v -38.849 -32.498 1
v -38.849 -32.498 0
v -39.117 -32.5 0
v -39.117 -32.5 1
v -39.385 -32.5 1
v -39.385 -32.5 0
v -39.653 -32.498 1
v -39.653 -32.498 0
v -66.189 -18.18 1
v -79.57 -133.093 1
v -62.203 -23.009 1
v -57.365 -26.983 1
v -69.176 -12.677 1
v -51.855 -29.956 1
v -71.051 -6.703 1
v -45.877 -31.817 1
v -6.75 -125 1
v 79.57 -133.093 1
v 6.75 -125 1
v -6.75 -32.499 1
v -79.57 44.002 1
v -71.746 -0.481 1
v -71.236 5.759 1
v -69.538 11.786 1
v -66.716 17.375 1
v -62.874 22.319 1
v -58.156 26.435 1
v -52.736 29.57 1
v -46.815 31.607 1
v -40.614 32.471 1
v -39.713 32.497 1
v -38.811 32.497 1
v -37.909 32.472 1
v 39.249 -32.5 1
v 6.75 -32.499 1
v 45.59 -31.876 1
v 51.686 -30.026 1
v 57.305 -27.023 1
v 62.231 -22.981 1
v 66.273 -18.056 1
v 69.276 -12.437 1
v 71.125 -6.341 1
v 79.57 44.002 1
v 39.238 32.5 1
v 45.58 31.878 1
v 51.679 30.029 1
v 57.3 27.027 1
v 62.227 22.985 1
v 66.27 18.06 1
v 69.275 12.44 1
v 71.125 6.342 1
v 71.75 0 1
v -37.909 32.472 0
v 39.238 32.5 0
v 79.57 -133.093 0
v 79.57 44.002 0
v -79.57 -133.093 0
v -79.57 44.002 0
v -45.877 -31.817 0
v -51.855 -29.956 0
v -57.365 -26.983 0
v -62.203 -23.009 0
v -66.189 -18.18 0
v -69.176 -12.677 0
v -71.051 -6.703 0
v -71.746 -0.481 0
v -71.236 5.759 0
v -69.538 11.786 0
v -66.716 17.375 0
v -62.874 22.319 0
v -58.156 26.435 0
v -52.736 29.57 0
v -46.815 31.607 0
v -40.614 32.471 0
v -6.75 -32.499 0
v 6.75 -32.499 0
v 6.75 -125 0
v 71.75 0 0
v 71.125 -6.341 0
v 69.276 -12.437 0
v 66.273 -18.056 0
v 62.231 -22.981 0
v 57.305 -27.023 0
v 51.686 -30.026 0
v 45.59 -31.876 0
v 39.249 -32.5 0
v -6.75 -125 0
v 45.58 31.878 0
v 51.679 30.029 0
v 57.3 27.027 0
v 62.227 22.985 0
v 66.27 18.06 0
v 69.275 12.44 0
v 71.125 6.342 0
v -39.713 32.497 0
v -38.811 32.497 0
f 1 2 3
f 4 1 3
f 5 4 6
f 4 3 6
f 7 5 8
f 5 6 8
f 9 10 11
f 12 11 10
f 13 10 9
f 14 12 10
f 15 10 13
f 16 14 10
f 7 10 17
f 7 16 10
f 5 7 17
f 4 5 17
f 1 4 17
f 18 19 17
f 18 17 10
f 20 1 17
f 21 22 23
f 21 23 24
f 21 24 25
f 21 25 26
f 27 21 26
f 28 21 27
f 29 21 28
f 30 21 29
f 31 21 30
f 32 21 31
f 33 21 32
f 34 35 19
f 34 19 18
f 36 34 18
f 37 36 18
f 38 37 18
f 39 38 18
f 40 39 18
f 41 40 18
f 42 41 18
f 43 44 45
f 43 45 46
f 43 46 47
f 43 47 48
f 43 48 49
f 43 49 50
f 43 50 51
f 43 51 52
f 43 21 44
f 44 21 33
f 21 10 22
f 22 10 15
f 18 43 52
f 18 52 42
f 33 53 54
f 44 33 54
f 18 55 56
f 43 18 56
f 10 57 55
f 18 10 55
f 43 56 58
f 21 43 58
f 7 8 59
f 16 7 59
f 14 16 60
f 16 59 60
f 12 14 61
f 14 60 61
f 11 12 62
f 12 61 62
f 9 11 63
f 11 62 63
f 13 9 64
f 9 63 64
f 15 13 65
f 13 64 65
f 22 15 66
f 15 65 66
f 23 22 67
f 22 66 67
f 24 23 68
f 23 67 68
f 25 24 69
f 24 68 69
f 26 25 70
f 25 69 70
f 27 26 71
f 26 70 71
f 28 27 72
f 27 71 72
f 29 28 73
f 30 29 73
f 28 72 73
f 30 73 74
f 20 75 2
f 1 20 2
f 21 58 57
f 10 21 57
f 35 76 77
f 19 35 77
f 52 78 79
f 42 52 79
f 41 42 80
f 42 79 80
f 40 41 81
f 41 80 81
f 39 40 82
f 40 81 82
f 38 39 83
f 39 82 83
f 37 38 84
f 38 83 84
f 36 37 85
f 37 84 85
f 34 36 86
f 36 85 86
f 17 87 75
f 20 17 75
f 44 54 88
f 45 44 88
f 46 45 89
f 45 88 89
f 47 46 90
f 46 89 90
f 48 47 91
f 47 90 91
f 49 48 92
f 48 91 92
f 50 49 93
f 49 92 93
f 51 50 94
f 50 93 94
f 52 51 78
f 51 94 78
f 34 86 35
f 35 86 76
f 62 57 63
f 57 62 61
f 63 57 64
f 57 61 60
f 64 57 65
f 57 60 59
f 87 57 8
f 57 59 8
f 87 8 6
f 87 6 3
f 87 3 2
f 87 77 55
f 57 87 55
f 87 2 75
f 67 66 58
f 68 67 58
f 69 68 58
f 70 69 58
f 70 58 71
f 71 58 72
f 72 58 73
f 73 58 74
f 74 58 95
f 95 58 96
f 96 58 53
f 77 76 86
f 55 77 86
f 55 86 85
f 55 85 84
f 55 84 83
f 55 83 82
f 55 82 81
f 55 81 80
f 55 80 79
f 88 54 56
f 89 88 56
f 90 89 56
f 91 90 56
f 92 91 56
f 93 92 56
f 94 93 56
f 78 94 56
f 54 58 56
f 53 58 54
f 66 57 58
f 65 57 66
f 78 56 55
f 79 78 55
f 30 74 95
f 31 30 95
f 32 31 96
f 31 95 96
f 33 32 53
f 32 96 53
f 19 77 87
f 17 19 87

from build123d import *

# Parameters (mm, degrees)
F1_DEPTH = 1


with BuildPart() as f1:
    # F0 (on Top) → F1 (new body)
    with BuildSketch(Plane.XY):
        Polygon((79.570077, 44.001997), (0, 44.001997), (-79.570077, 44.001997), (-79.570077, -133.093104), (0, -133.093104), (79.570077, -133.093104), align=None)
        with BuildLine():
            Line((-37.90909, 32.472326), (39.238343, 32.499998))
            ThreePointArc((39.238343, 32.499998), (62.226849, 22.985092), (71.75, 0))
            ThreePointArc((71.75, 0), (62.230607, -22.981334), (39.248972, -32.5))
            Line((39.248972, -32.5), (6.75, -32.498972))
            Line((6.75, -32.498972), (6.75, -125))
            Line((6.75, -125), (-6.75, -125))
            Line((-6.75, -125), (-6.75, -32.498545))
            Line((-6.75, -32.498545), (-38.849285, -32.49753))
            ThreePointArc((-38.849285, -32.49753), (-39.251028, -32.5), (-39.652771, -32.497504))
            ThreePointArc((-39.652771, -32.497504), (-71.746442, -0.480895), (-40.614204, 32.471356))
            ThreePointArc((-40.614204, 32.471356), (-39.261657, 32.499998), (-37.90909, 32.472326))
        make_face(mode=Mode.SUBTRACT)
    extrude(amount=F1_DEPTH)


solid = f1.part
